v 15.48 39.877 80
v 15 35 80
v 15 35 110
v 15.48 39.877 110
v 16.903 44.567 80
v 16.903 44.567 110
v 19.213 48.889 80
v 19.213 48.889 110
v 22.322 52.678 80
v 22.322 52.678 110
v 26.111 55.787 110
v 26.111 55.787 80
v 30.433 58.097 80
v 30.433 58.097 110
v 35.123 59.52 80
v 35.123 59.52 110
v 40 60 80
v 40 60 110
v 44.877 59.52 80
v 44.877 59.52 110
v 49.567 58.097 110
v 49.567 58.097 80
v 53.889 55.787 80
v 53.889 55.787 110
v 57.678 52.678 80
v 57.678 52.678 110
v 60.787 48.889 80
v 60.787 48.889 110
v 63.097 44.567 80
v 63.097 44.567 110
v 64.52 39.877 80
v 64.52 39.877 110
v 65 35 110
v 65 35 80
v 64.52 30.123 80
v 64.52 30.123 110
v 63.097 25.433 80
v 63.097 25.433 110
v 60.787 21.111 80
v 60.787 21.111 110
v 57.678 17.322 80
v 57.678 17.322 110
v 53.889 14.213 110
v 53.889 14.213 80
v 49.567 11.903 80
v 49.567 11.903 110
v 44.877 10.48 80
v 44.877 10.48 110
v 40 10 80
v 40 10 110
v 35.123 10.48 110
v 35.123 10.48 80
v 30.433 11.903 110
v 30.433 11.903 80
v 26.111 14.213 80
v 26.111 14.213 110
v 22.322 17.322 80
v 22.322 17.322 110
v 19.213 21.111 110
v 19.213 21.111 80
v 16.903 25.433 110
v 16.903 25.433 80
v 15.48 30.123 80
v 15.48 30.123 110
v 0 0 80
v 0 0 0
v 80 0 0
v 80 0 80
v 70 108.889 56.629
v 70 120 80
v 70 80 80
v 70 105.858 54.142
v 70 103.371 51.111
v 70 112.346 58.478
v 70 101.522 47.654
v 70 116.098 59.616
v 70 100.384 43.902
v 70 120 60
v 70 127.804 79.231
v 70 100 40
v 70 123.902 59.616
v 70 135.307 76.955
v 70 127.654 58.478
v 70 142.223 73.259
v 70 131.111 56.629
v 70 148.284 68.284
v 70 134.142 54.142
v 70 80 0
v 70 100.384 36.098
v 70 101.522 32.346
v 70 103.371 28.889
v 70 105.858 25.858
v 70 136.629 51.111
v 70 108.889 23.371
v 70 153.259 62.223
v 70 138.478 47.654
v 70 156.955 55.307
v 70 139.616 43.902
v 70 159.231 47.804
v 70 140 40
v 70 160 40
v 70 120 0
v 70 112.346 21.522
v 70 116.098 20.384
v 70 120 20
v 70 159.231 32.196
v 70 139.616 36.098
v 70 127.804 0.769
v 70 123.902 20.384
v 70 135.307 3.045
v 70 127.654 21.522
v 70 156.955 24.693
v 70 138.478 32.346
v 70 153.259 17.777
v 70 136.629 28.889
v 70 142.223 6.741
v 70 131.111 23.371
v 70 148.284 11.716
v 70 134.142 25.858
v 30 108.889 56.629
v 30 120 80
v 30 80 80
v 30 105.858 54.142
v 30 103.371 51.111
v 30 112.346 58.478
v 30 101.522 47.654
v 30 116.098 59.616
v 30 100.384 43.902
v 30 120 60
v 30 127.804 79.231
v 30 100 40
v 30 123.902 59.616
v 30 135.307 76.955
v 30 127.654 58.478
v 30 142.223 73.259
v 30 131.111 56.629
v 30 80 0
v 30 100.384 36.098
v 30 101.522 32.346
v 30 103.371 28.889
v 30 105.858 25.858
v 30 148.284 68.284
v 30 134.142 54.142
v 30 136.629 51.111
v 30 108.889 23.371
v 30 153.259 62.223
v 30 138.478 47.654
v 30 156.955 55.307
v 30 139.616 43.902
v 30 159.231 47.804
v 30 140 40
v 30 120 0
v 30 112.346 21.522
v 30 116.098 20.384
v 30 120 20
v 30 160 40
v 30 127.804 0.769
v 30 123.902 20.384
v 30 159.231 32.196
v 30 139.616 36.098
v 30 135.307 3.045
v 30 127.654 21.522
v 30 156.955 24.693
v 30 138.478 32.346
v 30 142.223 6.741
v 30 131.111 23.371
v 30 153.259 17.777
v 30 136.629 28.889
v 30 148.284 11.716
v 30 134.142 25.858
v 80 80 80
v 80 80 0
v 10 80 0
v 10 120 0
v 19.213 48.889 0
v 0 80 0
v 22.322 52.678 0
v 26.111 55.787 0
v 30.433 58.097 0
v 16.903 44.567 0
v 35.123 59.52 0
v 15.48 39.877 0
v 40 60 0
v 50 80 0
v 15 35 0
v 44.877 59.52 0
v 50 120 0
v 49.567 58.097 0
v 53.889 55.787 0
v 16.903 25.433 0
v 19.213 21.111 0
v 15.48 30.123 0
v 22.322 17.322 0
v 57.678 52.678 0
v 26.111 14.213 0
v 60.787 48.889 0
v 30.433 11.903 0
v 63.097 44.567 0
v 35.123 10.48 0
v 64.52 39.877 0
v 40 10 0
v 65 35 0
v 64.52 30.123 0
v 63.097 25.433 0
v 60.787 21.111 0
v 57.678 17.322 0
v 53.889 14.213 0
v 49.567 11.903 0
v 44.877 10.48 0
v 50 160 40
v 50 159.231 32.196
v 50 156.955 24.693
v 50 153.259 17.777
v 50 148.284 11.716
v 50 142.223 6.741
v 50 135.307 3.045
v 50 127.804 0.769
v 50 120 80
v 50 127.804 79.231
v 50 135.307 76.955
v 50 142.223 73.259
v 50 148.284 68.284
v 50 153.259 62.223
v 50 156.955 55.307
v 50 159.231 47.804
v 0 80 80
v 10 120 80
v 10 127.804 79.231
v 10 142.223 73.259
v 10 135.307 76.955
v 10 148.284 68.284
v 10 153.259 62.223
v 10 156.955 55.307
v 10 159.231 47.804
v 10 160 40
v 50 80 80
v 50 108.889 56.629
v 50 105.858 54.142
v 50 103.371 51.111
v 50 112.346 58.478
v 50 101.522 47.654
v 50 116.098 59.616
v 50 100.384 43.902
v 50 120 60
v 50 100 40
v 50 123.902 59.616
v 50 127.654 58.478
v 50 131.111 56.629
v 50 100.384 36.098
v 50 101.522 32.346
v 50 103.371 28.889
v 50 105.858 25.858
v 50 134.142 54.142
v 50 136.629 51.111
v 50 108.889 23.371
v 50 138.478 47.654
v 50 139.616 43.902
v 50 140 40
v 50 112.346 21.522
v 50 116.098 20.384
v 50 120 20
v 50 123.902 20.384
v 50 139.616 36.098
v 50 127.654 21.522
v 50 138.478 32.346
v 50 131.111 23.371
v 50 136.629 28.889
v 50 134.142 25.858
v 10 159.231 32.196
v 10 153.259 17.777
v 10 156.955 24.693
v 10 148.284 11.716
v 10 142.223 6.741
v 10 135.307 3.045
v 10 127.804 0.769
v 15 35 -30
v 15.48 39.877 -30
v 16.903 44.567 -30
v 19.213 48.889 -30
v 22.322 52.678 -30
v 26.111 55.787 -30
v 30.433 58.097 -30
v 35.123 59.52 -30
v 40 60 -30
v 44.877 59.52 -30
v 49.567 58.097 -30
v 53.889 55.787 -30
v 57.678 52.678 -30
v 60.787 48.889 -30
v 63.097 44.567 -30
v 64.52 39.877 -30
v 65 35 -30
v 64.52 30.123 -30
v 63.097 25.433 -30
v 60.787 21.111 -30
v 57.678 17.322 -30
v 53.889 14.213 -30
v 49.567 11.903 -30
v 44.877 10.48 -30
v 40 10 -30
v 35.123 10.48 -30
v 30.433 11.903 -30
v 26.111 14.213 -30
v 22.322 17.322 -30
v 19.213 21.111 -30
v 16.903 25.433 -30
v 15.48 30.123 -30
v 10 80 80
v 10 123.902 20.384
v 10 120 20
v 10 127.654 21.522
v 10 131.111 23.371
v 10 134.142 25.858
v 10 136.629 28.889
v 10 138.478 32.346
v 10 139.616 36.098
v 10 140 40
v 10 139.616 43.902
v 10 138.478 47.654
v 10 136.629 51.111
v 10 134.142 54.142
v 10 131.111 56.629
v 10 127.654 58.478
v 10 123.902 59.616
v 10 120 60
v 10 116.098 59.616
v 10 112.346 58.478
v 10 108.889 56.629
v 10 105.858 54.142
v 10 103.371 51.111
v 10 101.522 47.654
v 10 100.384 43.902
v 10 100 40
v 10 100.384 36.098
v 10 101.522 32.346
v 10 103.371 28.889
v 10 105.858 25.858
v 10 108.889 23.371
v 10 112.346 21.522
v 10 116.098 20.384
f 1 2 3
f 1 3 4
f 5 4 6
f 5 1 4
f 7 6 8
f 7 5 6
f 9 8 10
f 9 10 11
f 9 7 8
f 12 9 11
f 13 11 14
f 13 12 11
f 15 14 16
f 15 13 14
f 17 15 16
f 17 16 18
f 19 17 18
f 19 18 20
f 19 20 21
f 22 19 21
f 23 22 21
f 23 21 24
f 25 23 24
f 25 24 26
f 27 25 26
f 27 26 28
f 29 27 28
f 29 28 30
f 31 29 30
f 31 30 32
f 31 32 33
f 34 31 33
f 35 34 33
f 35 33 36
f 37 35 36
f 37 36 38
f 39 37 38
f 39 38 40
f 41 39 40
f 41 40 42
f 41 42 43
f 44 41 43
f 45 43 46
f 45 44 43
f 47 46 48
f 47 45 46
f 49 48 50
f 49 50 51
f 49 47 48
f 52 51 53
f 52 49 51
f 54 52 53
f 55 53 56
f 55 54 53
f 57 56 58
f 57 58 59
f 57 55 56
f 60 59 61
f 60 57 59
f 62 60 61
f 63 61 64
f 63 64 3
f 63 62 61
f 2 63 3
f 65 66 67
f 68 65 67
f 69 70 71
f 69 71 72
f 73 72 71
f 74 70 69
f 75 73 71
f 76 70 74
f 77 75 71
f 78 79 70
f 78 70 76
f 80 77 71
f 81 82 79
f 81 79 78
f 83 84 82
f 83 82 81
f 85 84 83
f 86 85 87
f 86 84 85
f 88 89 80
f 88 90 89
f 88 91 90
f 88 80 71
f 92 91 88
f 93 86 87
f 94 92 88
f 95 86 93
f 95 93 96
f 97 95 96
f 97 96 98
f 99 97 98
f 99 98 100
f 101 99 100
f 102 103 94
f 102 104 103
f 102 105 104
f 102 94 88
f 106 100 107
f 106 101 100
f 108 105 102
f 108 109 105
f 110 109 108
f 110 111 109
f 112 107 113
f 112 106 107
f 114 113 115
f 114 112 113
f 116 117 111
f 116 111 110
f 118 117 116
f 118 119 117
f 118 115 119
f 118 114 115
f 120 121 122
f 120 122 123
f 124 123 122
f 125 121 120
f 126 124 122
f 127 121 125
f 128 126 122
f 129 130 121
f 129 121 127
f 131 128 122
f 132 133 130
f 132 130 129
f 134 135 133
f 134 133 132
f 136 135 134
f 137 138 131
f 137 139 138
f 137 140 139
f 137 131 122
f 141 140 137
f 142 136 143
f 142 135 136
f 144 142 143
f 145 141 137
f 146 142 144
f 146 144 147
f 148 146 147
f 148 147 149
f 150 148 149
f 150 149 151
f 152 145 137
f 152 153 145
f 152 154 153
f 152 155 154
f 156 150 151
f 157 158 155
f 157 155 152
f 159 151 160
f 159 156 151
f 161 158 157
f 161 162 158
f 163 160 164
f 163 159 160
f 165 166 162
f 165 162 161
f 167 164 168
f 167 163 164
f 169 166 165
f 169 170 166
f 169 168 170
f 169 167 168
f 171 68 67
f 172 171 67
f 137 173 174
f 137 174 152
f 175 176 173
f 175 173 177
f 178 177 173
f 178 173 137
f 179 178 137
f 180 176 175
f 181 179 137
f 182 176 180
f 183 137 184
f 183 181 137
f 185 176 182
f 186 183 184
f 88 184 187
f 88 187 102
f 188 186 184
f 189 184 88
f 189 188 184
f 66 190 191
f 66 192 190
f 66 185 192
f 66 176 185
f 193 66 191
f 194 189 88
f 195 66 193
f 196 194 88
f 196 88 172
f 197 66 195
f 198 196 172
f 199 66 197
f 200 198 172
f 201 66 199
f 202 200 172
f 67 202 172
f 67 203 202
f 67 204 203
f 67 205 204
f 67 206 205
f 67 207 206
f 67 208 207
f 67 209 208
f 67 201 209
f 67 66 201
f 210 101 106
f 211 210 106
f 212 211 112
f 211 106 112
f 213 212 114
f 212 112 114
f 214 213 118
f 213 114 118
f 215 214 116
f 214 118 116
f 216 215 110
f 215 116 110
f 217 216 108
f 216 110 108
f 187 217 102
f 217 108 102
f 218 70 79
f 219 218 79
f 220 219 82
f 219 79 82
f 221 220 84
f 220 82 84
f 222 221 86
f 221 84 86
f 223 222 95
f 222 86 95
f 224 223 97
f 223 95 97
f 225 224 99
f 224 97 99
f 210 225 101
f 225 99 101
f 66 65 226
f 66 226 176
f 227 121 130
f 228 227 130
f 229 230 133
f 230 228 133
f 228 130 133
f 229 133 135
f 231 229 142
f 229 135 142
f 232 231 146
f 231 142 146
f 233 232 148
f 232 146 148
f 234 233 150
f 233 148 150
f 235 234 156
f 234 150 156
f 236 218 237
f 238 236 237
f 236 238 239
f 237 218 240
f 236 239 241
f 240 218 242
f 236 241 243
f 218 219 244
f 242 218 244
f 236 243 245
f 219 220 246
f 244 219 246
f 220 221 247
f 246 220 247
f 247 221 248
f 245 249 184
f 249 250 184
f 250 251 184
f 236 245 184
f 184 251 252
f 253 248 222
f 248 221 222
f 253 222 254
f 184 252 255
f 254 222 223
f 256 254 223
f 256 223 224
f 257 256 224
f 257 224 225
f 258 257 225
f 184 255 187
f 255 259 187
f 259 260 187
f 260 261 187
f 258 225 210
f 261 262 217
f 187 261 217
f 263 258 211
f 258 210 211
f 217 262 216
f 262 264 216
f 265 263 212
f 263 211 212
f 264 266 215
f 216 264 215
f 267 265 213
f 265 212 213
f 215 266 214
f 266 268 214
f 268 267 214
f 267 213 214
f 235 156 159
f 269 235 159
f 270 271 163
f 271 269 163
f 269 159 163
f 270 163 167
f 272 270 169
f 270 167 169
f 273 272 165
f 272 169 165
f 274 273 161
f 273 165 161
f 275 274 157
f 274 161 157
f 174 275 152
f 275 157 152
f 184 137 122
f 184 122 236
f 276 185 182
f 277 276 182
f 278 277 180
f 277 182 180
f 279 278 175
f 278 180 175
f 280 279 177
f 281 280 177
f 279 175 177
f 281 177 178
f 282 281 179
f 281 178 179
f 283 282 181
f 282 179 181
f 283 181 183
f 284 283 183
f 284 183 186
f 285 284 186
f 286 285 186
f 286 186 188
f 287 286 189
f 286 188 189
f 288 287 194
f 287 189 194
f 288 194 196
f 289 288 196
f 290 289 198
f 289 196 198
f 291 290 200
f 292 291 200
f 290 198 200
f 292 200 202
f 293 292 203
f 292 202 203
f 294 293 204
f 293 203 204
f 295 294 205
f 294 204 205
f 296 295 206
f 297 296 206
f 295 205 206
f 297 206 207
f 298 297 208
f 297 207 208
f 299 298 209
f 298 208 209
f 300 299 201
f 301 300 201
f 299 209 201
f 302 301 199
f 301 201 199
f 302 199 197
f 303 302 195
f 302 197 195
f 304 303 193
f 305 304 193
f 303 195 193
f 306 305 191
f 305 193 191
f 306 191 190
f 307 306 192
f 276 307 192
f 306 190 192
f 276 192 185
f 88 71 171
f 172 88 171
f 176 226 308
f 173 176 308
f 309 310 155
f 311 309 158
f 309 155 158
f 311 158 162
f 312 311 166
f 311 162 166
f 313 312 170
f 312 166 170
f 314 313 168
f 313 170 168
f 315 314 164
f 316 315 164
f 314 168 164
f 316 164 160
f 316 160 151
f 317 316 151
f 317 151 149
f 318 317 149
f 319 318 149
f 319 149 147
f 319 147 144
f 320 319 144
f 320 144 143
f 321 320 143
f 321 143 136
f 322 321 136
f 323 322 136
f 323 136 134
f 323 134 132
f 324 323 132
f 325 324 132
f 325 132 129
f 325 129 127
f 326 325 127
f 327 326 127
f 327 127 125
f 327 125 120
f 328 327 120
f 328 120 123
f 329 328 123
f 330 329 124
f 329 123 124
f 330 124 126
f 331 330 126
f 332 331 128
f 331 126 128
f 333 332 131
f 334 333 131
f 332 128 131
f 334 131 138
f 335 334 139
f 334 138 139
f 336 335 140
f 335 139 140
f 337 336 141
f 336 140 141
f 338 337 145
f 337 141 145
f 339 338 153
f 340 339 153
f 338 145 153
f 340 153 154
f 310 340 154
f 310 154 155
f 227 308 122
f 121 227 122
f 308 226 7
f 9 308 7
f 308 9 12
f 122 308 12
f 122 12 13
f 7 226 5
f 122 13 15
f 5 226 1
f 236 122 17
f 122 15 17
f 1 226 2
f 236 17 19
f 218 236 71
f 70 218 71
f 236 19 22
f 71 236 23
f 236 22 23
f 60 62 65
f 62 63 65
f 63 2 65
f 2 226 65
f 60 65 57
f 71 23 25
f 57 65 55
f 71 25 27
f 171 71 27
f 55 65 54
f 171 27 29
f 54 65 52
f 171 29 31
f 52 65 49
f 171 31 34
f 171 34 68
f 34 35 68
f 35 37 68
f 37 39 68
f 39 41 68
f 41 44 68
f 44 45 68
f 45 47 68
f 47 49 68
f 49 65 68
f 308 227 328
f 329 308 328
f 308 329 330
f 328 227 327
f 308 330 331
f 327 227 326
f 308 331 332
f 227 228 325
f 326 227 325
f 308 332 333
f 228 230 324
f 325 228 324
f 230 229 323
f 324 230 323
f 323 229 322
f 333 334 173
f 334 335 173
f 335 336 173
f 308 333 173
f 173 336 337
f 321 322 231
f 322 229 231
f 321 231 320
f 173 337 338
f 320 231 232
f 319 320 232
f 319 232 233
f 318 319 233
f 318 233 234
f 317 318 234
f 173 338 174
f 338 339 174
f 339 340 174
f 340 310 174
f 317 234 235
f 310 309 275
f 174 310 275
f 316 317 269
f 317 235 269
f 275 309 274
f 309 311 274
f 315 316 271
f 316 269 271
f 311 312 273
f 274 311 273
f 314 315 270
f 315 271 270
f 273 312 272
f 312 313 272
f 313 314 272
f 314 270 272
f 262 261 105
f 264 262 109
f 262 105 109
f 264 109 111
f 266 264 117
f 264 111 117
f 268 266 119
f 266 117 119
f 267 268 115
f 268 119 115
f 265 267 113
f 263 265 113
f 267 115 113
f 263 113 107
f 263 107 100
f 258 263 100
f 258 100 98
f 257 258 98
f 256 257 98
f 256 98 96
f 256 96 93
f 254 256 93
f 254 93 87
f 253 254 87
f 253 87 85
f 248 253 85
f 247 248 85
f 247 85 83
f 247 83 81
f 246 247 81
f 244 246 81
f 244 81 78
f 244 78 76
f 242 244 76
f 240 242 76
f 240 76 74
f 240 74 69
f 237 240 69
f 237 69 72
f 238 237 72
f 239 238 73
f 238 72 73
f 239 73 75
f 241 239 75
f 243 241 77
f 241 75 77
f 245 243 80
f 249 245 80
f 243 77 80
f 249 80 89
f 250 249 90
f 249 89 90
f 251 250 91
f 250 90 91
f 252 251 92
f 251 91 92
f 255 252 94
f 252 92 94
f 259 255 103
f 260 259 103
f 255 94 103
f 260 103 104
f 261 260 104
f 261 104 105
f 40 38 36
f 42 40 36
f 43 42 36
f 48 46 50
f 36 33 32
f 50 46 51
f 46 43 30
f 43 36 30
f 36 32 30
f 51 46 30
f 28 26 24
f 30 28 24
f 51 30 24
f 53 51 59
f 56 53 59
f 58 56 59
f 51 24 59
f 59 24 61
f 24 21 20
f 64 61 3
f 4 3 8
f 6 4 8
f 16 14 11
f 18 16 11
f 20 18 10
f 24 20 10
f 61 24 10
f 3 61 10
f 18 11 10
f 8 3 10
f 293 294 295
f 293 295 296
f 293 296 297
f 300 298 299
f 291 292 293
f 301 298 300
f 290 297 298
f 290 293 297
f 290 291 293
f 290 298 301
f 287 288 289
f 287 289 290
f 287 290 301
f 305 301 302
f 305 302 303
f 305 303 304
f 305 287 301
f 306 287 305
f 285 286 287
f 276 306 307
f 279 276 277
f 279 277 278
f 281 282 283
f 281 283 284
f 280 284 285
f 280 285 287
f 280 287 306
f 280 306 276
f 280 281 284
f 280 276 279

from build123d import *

# Parameters (mm, degrees)
CROQUIS1_W                   = 80
CROQUIS1_H                   = 80
SALIENTE_EXTRUIR1_DEPTH      = 160
CROQUIS2_W                   = 10
CROQUIS2_H                   = 80
CORTAR_EXTRUIR1_DEPTH        = 80
CROQUIS3_W                   = 20
CROQUIS3_H                   = 80
CORTAR_EXTRUIR2_DEPTH        = 80
CROQUIS4_R                   = 20
CORTAR_EXTRUIR3_DEPTH        = 80
CROQUIS5_R                   = 25
SALIENTE_EXTRUIR2_DEPTH      = 30
SALIENTE_EXTRUIR2_DEPTH_BACK = 110


with BuildPart() as part:
    # Croquis1 → Saliente-Extruir1 (new body)
    with BuildSketch(Plane(origin=(0, 0, 0), x_dir=(1, 0, 0), z_dir=(0, 1, 0))):
        with Locations((40, -40)):
            Rectangle(CROQUIS1_W, CROQUIS1_H)
    extrude(amount=SALIENTE_EXTRUIR1_DEPTH)

    # Croquis2 → Cortar-Extruir1 (cut)
    with BuildSketch(Plane(origin=(0, 160, 0), x_dir=(1, 0, 0), z_dir=(0, 1, 0))):
        with Locations((5, -40)):
            Rectangle(CROQUIS2_W, CROQUIS2_H)
        with Locations((75, -40)):
            Rectangle(CROQUIS2_W, CROQUIS2_H)
    extrude(amount=-CORTAR_EXTRUIR1_DEPTH, mode=Mode.SUBTRACT)

    # Croquis3 → Cortar-Extruir2 (cut)
    with BuildSketch(Plane(origin=(0, 160, 0), x_dir=(1, 0, 0), z_dir=(0, 1, 0))):
        with Locations((40, -40)):
            Rectangle(CROQUIS3_W, CROQUIS3_H)
    extrude(amount=-CORTAR_EXTRUIR2_DEPTH, mode=Mode.SUBTRACT)

    # Croquis4 → Cortar-Extruir3 (cut)
    with BuildSketch(Plane(origin=(70, 0, 0), x_dir=(0, 0, -1), z_dir=(1, 0, 0))):
        with BuildLine():
            Line((-80, 160), (-80, 120))
            ThreePointArc((-80, 120), (-68.284271247, 148.284271247), (-40, 160))
            Line((-40, 160), (-80, 160))
        make_face()
        with BuildLine():
            Line((0, 160), (-40, 160))
            ThreePointArc((-40, 160), (-11.715728753, 148.284271247), (0, 120))
            Line((0, 120), (0, 160))
        make_face()
        with Locations((-40, 120)):
            Circle(CROQUIS4_R)
    extrude(amount=-CORTAR_EXTRUIR3_DEPTH, mode=Mode.SUBTRACT)

    # Croquis5 → Saliente-Extruir2 (add, two sides)
    with BuildSketch(Plane(origin=(0, 0, 0), x_dir=(-1, 0, 0), z_dir=(0, 0, -1))) as saliente_extruir2_sk:
        with Locations((-40, 35)):
            Circle(CROQUIS5_R)
    extrude(amount=SALIENTE_EXTRUIR2_DEPTH)
    extrude(saliente_extruir2_sk.sketch, amount=-SALIENTE_EXTRUIR2_DEPTH_BACK)


solid = part.part
